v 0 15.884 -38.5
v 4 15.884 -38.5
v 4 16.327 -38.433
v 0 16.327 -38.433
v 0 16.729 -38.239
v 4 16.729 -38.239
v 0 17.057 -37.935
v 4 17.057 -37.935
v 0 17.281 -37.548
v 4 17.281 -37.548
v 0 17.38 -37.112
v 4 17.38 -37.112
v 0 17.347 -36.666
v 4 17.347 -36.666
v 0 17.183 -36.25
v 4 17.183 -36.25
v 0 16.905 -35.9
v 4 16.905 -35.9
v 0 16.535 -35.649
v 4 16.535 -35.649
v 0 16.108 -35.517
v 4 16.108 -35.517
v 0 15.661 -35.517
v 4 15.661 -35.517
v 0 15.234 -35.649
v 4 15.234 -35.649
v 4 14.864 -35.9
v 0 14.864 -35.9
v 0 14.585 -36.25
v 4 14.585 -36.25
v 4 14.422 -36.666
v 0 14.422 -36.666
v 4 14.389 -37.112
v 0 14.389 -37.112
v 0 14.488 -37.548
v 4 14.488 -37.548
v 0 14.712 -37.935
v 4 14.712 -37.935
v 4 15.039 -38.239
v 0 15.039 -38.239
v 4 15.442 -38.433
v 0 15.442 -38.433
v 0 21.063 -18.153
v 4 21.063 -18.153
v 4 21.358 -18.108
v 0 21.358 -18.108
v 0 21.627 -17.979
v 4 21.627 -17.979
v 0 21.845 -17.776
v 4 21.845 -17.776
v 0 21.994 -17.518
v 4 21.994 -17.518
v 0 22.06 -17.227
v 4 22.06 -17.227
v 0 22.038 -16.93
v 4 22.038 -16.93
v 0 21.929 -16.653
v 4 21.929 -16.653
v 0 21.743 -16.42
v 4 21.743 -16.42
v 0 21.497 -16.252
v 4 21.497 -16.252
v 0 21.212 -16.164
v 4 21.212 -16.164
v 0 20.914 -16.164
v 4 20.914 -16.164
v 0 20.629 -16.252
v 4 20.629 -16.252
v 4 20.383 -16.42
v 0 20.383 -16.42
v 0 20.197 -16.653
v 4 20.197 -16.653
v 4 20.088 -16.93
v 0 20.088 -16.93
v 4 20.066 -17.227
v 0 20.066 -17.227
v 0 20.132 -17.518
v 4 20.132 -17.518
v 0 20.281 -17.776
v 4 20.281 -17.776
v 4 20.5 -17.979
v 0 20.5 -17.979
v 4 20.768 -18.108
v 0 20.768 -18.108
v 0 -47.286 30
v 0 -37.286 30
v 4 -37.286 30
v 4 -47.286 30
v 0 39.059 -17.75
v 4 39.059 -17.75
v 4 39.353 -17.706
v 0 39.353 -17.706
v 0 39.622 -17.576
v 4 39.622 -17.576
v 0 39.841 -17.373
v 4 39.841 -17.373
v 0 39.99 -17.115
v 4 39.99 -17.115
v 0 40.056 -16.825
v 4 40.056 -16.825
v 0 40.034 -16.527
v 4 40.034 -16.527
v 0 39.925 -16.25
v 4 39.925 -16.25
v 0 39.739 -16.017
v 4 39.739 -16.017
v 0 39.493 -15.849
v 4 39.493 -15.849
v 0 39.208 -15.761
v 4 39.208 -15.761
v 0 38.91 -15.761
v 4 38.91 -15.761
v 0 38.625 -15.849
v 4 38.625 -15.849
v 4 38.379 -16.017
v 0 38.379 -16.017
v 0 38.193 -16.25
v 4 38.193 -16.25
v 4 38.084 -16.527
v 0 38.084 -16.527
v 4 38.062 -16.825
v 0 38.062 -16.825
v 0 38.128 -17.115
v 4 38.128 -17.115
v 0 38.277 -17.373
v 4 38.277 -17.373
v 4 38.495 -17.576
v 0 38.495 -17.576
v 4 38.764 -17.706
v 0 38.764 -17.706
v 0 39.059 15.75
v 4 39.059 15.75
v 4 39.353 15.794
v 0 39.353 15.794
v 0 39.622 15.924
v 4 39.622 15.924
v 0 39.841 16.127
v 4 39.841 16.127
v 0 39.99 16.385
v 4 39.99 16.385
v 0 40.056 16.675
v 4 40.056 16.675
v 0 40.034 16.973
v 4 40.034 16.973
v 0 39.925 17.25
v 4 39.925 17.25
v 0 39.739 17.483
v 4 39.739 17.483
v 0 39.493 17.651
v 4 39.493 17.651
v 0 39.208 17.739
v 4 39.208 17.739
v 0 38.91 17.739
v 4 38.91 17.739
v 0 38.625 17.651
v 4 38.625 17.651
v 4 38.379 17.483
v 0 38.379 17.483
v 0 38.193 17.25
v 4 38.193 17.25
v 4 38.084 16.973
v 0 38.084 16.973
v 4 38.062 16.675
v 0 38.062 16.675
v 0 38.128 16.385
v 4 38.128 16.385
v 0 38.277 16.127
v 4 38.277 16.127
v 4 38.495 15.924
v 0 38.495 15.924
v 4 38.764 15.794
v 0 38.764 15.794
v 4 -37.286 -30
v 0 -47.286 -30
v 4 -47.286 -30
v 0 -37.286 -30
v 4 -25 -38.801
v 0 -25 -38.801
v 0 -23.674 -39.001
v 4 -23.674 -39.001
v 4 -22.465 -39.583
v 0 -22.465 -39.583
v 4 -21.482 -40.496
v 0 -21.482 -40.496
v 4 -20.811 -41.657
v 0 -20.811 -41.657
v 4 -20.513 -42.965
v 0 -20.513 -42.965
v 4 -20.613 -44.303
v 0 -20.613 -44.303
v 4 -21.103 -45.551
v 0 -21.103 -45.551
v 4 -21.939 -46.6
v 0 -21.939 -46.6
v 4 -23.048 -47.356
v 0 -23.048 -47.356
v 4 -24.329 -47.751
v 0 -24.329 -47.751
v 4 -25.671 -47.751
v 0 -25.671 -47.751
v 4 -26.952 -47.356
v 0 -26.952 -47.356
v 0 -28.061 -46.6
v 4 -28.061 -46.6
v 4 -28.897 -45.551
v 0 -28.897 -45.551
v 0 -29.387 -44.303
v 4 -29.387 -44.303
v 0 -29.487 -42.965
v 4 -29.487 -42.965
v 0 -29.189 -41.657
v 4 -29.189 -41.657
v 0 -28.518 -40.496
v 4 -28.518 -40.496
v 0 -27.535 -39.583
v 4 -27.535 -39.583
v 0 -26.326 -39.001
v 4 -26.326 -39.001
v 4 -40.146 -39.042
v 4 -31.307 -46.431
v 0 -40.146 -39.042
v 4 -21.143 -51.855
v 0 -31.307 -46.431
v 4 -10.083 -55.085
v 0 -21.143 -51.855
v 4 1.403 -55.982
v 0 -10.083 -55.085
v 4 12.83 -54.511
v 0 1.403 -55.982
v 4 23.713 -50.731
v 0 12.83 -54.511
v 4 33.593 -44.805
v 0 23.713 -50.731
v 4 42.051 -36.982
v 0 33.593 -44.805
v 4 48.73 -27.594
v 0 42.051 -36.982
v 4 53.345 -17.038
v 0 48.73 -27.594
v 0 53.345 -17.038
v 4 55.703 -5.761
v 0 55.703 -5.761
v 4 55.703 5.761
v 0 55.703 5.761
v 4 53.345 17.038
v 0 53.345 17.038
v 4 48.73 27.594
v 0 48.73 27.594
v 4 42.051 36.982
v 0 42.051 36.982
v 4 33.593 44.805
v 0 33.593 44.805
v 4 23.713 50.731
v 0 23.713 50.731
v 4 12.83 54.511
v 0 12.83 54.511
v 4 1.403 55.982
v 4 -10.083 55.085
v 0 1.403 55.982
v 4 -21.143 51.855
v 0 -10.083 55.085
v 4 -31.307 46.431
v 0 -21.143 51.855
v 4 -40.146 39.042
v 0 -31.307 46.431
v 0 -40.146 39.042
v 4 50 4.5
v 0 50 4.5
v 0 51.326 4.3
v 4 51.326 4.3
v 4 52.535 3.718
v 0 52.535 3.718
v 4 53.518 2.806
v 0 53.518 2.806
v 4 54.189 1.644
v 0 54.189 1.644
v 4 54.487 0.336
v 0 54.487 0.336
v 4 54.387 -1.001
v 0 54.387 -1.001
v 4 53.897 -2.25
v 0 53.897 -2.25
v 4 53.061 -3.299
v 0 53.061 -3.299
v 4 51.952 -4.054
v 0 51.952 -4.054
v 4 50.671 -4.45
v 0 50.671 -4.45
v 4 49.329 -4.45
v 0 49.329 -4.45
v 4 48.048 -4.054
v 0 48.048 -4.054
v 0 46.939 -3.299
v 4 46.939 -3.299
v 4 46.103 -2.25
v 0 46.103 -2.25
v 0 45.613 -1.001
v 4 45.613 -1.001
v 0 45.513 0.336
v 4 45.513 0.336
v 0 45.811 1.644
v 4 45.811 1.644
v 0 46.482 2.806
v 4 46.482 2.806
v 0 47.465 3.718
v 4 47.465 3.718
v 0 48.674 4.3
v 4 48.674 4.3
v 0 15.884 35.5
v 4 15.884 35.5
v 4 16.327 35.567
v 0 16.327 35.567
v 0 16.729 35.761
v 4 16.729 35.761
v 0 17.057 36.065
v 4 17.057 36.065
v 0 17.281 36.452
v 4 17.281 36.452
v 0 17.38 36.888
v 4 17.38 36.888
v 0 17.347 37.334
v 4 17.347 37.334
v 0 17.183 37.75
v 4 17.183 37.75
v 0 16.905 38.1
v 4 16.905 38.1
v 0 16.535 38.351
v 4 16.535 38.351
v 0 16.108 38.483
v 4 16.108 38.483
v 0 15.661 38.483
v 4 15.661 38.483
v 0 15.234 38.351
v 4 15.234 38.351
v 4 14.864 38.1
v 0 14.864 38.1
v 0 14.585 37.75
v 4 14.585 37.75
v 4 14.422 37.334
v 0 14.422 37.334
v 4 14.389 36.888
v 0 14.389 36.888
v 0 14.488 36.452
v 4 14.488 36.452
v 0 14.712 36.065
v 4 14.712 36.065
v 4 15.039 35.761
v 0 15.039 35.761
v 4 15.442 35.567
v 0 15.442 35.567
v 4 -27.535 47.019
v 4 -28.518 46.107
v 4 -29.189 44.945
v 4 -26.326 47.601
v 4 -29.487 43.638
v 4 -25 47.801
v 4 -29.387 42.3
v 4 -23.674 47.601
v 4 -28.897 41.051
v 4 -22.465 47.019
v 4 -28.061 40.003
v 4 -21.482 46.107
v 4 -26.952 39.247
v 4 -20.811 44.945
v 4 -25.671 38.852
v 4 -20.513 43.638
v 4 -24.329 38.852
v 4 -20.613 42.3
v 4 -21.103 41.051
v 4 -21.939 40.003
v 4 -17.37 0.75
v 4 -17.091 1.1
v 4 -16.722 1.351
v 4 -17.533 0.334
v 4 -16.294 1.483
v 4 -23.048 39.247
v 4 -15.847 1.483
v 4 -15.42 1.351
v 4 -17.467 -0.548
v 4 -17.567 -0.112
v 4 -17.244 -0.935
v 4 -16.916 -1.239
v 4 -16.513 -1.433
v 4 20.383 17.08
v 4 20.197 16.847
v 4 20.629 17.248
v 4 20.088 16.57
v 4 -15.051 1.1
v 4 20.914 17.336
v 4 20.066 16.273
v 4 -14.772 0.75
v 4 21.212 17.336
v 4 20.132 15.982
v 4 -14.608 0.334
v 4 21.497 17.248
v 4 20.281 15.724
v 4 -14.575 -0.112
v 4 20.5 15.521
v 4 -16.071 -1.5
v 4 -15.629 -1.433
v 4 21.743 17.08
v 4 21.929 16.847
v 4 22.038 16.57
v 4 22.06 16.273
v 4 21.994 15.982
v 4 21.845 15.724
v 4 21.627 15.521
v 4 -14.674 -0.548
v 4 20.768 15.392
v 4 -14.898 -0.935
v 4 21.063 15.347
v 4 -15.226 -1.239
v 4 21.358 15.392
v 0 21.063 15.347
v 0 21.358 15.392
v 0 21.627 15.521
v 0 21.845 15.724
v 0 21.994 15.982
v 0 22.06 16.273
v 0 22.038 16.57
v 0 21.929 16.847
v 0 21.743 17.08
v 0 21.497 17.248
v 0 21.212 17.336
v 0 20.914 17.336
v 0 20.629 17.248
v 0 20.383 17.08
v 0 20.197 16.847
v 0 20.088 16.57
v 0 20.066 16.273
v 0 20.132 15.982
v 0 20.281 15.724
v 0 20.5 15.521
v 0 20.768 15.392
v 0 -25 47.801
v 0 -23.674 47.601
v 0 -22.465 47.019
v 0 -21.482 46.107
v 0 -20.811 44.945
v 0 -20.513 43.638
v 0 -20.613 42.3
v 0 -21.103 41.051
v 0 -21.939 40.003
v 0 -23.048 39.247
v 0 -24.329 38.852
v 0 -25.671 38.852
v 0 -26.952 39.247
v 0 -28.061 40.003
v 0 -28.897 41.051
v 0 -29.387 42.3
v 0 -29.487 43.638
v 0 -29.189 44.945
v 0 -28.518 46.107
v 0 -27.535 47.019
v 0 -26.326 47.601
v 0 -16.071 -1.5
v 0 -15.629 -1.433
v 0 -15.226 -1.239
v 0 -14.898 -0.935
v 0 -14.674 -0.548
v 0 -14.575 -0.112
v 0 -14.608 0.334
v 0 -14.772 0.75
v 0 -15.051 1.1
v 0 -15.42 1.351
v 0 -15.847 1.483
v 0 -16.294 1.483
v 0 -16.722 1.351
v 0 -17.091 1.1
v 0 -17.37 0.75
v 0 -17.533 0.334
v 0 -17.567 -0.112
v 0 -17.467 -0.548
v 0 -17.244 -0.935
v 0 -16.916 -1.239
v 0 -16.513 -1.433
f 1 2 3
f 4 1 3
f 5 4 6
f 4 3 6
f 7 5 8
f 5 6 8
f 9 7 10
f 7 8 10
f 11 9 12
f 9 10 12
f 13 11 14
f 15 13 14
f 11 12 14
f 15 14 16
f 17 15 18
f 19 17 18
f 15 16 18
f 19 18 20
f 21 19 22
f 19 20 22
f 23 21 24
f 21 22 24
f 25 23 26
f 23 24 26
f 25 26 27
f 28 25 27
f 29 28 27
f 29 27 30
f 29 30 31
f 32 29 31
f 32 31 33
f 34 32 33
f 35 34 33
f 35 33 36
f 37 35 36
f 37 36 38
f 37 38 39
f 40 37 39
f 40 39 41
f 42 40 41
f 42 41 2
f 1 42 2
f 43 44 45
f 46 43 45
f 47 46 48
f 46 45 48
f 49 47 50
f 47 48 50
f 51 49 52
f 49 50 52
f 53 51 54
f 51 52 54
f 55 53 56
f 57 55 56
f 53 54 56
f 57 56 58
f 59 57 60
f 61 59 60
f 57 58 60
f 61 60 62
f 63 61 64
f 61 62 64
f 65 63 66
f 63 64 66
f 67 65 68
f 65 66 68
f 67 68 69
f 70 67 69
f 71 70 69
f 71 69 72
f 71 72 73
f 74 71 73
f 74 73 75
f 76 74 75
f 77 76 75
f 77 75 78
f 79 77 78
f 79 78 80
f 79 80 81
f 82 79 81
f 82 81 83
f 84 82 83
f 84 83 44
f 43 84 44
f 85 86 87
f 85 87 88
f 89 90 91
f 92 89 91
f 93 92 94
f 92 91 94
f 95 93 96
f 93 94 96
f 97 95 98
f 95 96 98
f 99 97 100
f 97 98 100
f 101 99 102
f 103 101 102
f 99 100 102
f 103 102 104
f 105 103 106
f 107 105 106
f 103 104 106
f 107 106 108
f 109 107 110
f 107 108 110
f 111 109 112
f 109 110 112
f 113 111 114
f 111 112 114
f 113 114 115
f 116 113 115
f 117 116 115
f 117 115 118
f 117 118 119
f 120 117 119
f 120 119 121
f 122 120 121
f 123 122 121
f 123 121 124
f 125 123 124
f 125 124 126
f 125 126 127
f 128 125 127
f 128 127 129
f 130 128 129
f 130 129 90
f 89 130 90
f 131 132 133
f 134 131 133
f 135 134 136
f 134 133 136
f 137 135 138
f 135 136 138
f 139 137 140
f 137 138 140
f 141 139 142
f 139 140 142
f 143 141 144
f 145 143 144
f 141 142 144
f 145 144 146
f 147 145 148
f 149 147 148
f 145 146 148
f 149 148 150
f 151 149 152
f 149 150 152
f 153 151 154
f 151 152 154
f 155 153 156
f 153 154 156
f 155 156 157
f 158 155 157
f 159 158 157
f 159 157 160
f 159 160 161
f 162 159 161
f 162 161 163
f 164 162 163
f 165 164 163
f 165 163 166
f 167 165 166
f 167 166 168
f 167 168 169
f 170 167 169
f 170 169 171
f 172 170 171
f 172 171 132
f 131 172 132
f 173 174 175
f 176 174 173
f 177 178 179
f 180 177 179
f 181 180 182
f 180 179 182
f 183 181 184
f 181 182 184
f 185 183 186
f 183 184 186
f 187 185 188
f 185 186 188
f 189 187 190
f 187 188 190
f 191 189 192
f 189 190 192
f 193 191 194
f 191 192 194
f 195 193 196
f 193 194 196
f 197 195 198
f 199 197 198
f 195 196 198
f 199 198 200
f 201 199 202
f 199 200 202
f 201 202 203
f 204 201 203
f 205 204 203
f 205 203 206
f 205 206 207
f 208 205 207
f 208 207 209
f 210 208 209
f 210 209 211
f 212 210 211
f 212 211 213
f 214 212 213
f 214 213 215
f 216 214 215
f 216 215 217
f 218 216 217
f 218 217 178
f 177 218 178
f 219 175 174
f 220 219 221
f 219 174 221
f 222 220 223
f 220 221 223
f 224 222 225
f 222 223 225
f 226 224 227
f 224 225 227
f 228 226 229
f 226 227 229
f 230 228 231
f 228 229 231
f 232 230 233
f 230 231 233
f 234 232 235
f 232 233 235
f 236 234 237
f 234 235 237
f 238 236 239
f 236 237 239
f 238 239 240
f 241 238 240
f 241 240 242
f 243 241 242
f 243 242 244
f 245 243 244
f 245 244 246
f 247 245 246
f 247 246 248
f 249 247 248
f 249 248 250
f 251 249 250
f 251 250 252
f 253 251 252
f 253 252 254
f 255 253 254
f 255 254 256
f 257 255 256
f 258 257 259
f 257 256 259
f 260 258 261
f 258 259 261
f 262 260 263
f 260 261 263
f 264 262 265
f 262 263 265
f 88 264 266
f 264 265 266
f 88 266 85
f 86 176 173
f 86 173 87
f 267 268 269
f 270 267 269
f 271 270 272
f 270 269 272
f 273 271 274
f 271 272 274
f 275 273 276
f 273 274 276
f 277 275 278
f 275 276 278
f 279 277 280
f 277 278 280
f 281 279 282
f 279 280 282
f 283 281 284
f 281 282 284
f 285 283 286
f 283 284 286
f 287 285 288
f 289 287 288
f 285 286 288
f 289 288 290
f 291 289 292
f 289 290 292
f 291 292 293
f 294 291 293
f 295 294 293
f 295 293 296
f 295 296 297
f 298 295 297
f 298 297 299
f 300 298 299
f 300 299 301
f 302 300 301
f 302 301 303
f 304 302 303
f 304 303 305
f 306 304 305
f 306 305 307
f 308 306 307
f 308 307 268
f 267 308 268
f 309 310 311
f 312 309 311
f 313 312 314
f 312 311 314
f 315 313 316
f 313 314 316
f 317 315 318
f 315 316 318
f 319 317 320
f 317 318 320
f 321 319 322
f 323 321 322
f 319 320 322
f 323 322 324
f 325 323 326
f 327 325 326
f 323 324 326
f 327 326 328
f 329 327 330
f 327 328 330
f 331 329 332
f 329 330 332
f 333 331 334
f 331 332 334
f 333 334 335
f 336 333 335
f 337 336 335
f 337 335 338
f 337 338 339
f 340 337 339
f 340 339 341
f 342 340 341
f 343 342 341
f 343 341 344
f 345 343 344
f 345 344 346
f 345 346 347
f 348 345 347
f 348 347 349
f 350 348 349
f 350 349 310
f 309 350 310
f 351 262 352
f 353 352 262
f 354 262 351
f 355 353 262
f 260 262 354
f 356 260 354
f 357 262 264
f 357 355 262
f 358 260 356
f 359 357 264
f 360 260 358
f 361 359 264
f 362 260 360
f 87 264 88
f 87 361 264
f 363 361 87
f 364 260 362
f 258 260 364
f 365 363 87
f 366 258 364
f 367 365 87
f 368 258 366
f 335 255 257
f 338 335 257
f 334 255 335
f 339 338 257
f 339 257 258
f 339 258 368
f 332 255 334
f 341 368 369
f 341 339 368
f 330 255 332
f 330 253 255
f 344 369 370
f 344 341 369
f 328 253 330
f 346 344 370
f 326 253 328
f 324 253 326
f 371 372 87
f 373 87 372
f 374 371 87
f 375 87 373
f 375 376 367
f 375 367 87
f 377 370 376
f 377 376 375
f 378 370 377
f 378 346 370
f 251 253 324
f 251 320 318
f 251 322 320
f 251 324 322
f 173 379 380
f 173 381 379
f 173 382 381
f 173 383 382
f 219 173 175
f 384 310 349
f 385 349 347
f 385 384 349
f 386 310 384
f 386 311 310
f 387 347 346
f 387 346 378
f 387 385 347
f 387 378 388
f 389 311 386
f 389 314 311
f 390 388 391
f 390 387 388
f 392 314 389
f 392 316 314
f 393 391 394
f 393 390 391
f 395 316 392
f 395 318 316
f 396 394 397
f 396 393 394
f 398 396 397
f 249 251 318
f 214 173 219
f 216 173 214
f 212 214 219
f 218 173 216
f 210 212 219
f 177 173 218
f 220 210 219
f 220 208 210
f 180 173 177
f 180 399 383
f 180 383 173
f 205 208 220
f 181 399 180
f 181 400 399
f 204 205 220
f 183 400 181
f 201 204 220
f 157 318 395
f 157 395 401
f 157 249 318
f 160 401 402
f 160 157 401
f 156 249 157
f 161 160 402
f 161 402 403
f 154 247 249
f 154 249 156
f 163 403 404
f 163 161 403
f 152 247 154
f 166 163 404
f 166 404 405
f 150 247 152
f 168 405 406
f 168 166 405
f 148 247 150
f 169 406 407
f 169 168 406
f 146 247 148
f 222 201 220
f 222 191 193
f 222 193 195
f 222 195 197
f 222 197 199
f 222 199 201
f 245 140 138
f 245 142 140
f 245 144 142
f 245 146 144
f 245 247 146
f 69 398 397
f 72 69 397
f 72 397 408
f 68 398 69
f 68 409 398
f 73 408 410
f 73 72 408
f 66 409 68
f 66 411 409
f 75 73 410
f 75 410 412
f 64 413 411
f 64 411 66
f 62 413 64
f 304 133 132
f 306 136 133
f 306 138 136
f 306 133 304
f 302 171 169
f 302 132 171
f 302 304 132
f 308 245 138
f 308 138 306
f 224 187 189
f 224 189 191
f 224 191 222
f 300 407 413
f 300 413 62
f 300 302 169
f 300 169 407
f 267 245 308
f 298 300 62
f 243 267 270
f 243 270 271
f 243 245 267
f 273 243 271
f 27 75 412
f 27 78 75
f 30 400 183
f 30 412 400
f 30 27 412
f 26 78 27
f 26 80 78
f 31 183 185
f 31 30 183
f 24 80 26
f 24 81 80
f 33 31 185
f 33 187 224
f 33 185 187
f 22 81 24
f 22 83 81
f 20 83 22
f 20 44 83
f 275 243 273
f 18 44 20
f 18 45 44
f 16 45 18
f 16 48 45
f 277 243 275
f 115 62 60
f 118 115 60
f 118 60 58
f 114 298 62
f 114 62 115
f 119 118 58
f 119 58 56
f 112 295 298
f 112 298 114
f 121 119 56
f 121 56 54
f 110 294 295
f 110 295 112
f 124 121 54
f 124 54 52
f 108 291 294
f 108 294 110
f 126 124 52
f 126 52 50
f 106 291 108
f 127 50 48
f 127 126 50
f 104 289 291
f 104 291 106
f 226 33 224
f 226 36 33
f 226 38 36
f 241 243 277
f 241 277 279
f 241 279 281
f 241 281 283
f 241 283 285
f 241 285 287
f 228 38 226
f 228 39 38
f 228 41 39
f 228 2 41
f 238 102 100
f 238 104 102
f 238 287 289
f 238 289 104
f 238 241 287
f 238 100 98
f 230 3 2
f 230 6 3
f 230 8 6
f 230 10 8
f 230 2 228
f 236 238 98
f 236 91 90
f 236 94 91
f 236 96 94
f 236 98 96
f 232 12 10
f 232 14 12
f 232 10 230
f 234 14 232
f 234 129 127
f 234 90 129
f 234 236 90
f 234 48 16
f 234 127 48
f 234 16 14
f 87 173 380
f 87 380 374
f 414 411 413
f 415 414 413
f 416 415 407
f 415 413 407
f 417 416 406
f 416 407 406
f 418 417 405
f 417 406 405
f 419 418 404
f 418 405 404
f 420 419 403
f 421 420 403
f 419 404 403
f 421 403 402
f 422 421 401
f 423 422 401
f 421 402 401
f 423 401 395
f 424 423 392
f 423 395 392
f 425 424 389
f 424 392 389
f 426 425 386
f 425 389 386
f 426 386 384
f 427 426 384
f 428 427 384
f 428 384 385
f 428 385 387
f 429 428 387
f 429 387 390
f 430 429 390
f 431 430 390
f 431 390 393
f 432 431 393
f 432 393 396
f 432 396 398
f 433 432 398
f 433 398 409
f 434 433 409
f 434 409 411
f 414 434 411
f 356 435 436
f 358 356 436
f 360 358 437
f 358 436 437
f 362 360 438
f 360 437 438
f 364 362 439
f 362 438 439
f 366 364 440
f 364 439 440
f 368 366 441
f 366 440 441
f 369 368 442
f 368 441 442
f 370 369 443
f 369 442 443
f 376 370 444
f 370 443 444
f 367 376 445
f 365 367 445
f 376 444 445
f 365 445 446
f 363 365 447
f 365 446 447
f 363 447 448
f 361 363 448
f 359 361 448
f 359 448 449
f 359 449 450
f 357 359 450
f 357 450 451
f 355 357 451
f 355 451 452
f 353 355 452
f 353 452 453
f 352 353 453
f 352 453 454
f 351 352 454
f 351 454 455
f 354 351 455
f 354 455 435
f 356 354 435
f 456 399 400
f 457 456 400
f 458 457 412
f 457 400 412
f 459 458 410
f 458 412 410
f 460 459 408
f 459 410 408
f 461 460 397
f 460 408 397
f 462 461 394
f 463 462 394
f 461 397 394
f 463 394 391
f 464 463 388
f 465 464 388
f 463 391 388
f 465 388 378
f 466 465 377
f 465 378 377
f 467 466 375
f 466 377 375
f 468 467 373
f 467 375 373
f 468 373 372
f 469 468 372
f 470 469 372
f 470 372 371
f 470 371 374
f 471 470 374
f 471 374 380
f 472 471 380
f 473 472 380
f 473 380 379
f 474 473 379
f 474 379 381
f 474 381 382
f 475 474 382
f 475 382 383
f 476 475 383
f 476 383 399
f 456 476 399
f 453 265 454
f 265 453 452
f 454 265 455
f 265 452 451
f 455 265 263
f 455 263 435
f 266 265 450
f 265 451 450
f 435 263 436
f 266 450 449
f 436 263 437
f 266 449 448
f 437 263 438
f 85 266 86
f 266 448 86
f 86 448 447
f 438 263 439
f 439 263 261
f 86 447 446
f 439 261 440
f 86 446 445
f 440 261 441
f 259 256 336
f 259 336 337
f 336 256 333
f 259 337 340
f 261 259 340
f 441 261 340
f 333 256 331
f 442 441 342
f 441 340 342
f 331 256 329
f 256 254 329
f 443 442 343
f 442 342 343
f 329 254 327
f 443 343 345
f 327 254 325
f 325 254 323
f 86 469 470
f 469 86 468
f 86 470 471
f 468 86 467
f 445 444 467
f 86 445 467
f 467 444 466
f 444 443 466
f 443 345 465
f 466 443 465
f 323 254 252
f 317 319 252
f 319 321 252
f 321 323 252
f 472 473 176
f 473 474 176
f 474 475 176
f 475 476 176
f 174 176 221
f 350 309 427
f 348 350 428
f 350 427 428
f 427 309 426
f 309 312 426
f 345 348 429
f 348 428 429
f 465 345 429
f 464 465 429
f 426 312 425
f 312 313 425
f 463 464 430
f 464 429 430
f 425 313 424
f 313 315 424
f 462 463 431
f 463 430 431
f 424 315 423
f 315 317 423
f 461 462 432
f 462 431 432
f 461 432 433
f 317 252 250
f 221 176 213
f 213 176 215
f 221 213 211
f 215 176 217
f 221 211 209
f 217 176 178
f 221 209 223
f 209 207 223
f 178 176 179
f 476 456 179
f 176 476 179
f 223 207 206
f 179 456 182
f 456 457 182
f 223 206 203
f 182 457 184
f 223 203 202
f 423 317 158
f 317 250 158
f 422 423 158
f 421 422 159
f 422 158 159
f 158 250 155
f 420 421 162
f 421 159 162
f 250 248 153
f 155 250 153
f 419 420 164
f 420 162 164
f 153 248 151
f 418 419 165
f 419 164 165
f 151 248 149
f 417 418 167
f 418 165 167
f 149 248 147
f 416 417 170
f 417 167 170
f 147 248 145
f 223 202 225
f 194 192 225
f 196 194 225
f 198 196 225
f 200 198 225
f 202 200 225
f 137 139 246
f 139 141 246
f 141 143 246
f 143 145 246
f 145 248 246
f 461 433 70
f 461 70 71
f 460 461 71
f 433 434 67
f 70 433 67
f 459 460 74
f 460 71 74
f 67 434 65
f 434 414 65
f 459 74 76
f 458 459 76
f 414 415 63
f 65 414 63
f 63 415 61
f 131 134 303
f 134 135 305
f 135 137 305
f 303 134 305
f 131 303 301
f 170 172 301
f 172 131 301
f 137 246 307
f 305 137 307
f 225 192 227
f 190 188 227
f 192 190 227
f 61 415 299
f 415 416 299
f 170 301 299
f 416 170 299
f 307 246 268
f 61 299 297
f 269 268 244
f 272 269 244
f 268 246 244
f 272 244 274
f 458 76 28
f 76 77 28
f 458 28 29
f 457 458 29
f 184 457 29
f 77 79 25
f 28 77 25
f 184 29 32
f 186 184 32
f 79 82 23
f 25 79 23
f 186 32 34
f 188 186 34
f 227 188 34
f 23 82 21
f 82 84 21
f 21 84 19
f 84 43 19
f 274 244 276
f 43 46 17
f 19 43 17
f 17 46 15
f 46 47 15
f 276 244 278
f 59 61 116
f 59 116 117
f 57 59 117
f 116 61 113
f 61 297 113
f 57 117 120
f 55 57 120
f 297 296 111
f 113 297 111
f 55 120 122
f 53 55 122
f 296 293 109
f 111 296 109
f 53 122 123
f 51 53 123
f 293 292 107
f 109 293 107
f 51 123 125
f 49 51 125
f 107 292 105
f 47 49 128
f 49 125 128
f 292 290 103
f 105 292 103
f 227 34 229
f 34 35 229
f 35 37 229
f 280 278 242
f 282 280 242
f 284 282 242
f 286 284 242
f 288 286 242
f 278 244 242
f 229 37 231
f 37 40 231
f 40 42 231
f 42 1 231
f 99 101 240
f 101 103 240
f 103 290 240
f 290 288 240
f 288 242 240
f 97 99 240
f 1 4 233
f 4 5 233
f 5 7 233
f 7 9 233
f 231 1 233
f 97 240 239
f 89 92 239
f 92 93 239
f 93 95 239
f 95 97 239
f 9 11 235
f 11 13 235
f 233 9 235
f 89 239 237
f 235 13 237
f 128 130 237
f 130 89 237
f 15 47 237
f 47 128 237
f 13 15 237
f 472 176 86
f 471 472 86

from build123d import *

# Parameters (mm, degrees)
SKETCH1_R           = 56
BOSS_EXTRUDE1_DEPTH = 4
SKETCH2_R           = 4.5
CUT_EXTRUDE1_DEPTH  = 80.296910406
CUT_EXTRUDE2_DEPTH  = 80.296910406
SKETCH4_R           = 1
SKETCH4_R_2         = 1.5
CUT_EXTRUDE3_DEPTH  = 80.296910406


with BuildPart() as part:
    # Sketch1 → Boss-Extrude1 (new body)
    with BuildSketch(Plane(origin=(0, 0, 0), x_dir=(0, 0, -1), z_dir=(1, 0, 0))):
        Circle(SKETCH1_R)
    extrude(amount=BOSS_EXTRUDE1_DEPTH)

    # Sketch2 → Cut-Extrude1 (cut, through all)
    with BuildSketch(Plane.ZY):
        with Locations((0, 50)):
            Circle(SKETCH2_R)
        with Locations((43.301270189, -25)):
            Circle(SKETCH2_R)
        with Locations((-43.301270189, -25)):
            Circle(SKETCH2_R)
    extrude(amount=-CUT_EXTRUDE1_DEPTH, mode=Mode.SUBTRACT)

    # Sketch3 → Cut-Extrude2 (cut, through all)
    with BuildSketch(Plane.ZY):
        with BuildLine():
            Line((-30, -47.28636167), (-30, -37.28636167))
            Line((-30, -37.28636167), (30, -37.28636167))
            Line((30, -37.28636167), (30, -47.28636167))
            ThreePointArc((30, -47.28636167), (0, -56), (-30, -47.28636167))
        make_face()
    extrude(amount=-CUT_EXTRUDE2_DEPTH, mode=Mode.SUBTRACT)

    # Sketch4 → Cut-Extrude3 (cut, through all)
    with BuildSketch(Plane(origin=(4, 0, 0), x_dir=(0, 0, -1), z_dir=(1, 0, 0))):
        with Locations((-16.75, 39.058710316)):
            Circle(SKETCH4_R)
        with Locations((16.75, 39.058710316)):
            Circle(SKETCH4_R)
        with Locations((17.152725495, 21.063216097)):
            Circle(SKETCH4_R)
        with Locations((-16.347274505, 21.063216097)):
            Circle(SKETCH4_R)
        with Locations((-37, 15.884372564)):
            Circle(SKETCH4_R_2)
        with Locations((0, -16.070778671)):
            Circle(SKETCH4_R_2)
        with Locations((37, 15.884372564)):
            Circle(SKETCH4_R_2)
    extrude(amount=-CUT_EXTRUDE3_DEPTH, mode=Mode.SUBTRACT)


solid = part.part
